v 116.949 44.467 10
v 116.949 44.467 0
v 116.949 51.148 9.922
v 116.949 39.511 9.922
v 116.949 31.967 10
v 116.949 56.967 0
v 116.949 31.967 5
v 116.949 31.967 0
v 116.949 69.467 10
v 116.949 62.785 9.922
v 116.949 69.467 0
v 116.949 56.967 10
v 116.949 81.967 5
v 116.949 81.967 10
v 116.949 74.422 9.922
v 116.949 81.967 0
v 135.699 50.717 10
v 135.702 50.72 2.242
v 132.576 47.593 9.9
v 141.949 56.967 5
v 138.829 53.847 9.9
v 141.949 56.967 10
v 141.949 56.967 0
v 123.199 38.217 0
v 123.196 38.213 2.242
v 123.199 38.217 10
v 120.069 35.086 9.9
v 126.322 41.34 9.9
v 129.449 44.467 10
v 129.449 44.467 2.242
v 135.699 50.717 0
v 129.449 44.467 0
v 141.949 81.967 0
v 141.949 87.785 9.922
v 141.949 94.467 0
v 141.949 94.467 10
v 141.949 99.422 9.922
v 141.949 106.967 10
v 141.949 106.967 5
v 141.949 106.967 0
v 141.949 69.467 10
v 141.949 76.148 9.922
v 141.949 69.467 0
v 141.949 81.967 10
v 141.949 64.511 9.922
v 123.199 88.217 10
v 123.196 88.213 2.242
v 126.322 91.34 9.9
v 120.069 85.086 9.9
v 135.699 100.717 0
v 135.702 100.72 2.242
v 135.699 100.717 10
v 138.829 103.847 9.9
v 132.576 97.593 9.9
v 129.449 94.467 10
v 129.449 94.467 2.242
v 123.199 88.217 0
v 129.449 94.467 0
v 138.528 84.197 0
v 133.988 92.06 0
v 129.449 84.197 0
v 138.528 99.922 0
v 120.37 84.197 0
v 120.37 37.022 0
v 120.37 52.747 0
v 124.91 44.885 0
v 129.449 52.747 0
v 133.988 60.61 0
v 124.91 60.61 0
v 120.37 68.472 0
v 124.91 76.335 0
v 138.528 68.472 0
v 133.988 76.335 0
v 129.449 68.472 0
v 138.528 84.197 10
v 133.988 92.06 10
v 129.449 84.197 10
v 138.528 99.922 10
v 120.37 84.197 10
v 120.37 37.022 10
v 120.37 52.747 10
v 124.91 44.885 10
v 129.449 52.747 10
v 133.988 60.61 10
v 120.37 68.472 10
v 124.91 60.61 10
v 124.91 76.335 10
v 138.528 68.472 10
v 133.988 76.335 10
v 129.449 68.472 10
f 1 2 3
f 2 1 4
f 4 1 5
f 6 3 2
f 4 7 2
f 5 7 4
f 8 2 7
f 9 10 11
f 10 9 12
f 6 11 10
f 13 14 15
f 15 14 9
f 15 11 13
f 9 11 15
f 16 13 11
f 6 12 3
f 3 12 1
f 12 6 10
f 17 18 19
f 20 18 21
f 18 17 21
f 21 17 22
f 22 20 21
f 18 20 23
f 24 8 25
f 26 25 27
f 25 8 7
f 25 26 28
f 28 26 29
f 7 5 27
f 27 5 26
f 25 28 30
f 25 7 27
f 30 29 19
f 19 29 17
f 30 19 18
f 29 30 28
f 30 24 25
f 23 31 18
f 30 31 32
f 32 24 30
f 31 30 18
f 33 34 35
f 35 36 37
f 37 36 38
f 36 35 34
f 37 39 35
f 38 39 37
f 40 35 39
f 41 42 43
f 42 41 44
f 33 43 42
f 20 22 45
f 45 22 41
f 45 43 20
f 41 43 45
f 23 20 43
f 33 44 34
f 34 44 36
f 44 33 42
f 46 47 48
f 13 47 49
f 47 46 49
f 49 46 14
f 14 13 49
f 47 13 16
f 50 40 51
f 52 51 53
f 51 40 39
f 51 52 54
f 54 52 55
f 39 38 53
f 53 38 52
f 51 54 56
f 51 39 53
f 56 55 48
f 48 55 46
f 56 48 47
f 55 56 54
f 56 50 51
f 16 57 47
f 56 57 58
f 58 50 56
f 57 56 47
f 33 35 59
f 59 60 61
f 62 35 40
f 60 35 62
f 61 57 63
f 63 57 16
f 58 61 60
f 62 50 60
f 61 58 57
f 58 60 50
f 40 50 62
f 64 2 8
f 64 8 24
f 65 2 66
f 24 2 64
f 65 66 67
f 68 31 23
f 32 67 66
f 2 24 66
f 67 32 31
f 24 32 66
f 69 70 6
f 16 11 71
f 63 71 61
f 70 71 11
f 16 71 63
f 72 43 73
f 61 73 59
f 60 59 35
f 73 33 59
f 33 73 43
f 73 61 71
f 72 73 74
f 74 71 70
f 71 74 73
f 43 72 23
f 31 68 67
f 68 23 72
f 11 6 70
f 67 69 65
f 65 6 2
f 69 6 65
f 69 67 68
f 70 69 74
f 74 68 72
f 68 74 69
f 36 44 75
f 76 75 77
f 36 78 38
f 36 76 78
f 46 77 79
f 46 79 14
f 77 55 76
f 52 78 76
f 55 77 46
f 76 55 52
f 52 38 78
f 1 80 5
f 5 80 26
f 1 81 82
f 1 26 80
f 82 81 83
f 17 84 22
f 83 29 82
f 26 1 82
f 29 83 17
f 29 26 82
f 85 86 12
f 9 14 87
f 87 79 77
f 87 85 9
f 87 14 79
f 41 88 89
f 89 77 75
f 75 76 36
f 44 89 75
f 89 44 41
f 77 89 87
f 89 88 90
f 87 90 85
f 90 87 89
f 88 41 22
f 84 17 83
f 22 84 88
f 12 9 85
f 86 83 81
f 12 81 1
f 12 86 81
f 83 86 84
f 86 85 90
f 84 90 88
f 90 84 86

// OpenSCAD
// CSG file generated from FreeCAD 0.20.29177 (Git)
group() {
 group(){
polyhedron ( points = [[116.949066,81.966621,0.000000],[116.949066,81.966621,10.000000],[116.949066,31.966625,0.000000],[116.949066,31.966625,10.000000],[141.949066,56.966625,0.000000],[141.949066,56.966625,10.000000],[141.949066,106.966621,0.000000],[141.949066,106.966621,10.000000],[116.949066,81.966621,5.000000],[116.949066,31.966625,5.000000],[116.949066,69.466621,0.000000],[116.949066,56.966625,0.000000],[116.949066,44.466625,0.000000],[116.949066,69.466621,10.000000],[116.949066,56.966625,10.000000],[116.949066,44.466625,10.000000],[141.949066,56.966625,5.000000],[123.199066,38.216625,0.000000],[129.449066,44.466625,0.000000],[135.699066,50.716625,0.000000],[123.199066,38.216625,10.000000],[129.449066,44.466625,10.000000],[135.699066,50.716625,10.000000],[141.949066,106.966621,5.000000],[141.949066,69.466621,0.000000],[141.949066,81.966621,0.000000],[141.949066,94.466621,0.000000],[141.949066,69.466621,10.000000],[141.949066,81.966621,10.000000],[141.949066,94.466621,10.000000],[135.699066,100.716621,0.000000],[129.449066,94.466621,0.000000],[123.199066,88.216621,0.000000],[135.699066,100.716621,10.000000],[129.449066,94.466621,10.000000],[123.199066,88.216621,10.000000],[116.949066,39.511497,9.922277],[116.949066,51.148251,9.922277],[116.949066,62.785000,9.922277],[116.949066,74.421753,9.922277],[123.195641,38.213200,2.241523],[135.702499,50.720051,2.241523],[138.829208,53.846764,9.900373],[132.575775,47.593338,9.900373],[126.322357,41.339912,9.900373],[120.068932,35.086487,9.900373],[129.449066,44.466625,2.241523],[141.949066,99.421753,9.922277],[141.949066,87.785004,9.922277],[141.949066,76.148247,9.922277],[141.949066,64.511497,9.922277],[135.702499,100.720047,2.241523],[123.195641,88.213203,2.241523],[120.068932,85.086487,9.900373],[126.322357,91.339912,9.900373],[132.575775,97.593338,9.900373],[138.829208,103.846764,9.900373],[129.449066,94.466621,2.241523],[129.449066,84.197220,0.000000],[138.527908,99.922218,0.000000],[120.370232,37.022209,0.000000],[129.449066,52.747211,0.000000],[120.370232,68.472214,0.000000],[138.527908,68.472214,0.000000],[133.988480,92.059723,0.000000],[138.527908,84.197220,0.000000],[120.370232,84.197220,0.000000],[124.909653,44.884712,0.000000],[120.370232,52.747211,0.000000],[124.909653,76.334717,0.000000],[133.988480,76.334717,0.000000],[129.449066,68.472214,0.000000],[133.988480,60.609715,0.000000],[124.909653,60.609715,0.000000],[129.449066,84.197220,10.000000],[138.527908,99.922218,10.000000],[120.370232,37.022209,10.000000],[129.449066,52.747211,10.000000],[120.370232,68.472214,10.000000],[138.527908,68.472214,10.000000],[133.988480,92.059723,10.000000],[138.527908,84.197220,10.000000],[120.370232,84.197220,10.000000],[124.909653,44.884712,10.000000],[120.370232,52.747211,10.000000],[124.909653,76.334717,10.000000],[133.988480,76.334717,10.000000],[129.449066,68.472214,10.000000],[133.988480,60.609715,10.000000],[124.909653,60.609715,10.000000]], faces = [[37,12,15],[36,15,12],[3,15,36],[12,37,11],[12,9,36],[36,9,3],[9,12,2],[10,38,13],[14,13,38],[38,10,11],[39,1,8],[13,1,39],[8,10,39],[39,10,13],[10,8,0],[37,14,11],[15,14,37],[38,11,14],[43,41,22],[42,41,16],[42,22,41],[5,22,42],[42,16,5],[4,16,41],[40,2,17],[45,40,20],[9,2,40],[44,20,40],[21,20,44],[45,3,9],[20,3,45],[46,44,40],[45,9,40],[43,21,46],[22,21,43],[41,43,46],[44,46,21],[40,17,46],[41,19,4],[18,19,46],[46,17,18],[41,46,19],[26,48,25],[47,29,26],[7,29,47],[48,26,29],[26,23,47],[47,23,7],[23,26,6],[24,49,27],[28,27,49],[49,24,25],[50,5,16],[27,5,50],[16,24,50],[50,24,27],[24,16,4],[48,28,25],[29,28,48],[49,25,28],[54,52,35],[53,52,8],[53,35,52],[1,35,53],[53,8,1],[0,8,52],[51,6,30],[56,51,33],[23,6,51],[55,33,51],[34,33,55],[56,7,23],[33,7,56],[57,55,51],[56,23,51],[54,34,57],[35,34,54],[52,54,57],[55,57,34],[51,30,57],[52,32,0],[31,32,57],[57,30,31],[52,57,32],[65,26,25],[58,64,65],[6,26,59],[59,26,64],[66,32,58],[0,32,66],[64,58,31],[64,30,59],[32,31,58],[30,64,31],[59,30,6],[2,12,60],[17,2,60],[67,12,68],[60,12,17],[61,67,68],[4,19,72],[67,61,18],[67,17,12],[19,18,61],[67,18,17],[11,62,73],[69,10,0],[58,69,66],[10,69,62],[66,69,0],[70,24,63],[65,70,58],[26,65,64],[65,25,70],[24,70,25],[69,58,70],[71,70,63],[62,69,71],[70,71,69],[4,63,24],[61,72,19],[63,4,72],[62,11,10],[68,73,61],[12,11,68],[68,11,73],[72,61,73],[71,73,62],[63,72,71],[73,71,72],[81,28,29],[74,81,80],[7,75,29],[75,80,29],[82,74,35],[1,82,35],[80,34,74],[80,75,33],[35,74,34],[33,34,80],[75,7,33],[3,76,15],[20,76,3],[83,84,15],[76,20,15],[77,84,83],[5,88,22],[83,21,77],[83,15,20],[22,77,21],[83,20,21],[14,89,78],[85,1,13],[74,82,85],[13,78,85],[82,1,85],[86,79,27],[81,74,86],[29,80,81],[81,86,28],[27,28,86],[85,86,74],[87,79,86],[78,87,85],[86,85,87],[5,27,79],[77,22,88],[79,88,5],[78,13,14],[84,77,89],[15,84,14],[84,89,14],[88,89,77],[87,78,89],[79,87,88],[89,88,87]]);
}
}
